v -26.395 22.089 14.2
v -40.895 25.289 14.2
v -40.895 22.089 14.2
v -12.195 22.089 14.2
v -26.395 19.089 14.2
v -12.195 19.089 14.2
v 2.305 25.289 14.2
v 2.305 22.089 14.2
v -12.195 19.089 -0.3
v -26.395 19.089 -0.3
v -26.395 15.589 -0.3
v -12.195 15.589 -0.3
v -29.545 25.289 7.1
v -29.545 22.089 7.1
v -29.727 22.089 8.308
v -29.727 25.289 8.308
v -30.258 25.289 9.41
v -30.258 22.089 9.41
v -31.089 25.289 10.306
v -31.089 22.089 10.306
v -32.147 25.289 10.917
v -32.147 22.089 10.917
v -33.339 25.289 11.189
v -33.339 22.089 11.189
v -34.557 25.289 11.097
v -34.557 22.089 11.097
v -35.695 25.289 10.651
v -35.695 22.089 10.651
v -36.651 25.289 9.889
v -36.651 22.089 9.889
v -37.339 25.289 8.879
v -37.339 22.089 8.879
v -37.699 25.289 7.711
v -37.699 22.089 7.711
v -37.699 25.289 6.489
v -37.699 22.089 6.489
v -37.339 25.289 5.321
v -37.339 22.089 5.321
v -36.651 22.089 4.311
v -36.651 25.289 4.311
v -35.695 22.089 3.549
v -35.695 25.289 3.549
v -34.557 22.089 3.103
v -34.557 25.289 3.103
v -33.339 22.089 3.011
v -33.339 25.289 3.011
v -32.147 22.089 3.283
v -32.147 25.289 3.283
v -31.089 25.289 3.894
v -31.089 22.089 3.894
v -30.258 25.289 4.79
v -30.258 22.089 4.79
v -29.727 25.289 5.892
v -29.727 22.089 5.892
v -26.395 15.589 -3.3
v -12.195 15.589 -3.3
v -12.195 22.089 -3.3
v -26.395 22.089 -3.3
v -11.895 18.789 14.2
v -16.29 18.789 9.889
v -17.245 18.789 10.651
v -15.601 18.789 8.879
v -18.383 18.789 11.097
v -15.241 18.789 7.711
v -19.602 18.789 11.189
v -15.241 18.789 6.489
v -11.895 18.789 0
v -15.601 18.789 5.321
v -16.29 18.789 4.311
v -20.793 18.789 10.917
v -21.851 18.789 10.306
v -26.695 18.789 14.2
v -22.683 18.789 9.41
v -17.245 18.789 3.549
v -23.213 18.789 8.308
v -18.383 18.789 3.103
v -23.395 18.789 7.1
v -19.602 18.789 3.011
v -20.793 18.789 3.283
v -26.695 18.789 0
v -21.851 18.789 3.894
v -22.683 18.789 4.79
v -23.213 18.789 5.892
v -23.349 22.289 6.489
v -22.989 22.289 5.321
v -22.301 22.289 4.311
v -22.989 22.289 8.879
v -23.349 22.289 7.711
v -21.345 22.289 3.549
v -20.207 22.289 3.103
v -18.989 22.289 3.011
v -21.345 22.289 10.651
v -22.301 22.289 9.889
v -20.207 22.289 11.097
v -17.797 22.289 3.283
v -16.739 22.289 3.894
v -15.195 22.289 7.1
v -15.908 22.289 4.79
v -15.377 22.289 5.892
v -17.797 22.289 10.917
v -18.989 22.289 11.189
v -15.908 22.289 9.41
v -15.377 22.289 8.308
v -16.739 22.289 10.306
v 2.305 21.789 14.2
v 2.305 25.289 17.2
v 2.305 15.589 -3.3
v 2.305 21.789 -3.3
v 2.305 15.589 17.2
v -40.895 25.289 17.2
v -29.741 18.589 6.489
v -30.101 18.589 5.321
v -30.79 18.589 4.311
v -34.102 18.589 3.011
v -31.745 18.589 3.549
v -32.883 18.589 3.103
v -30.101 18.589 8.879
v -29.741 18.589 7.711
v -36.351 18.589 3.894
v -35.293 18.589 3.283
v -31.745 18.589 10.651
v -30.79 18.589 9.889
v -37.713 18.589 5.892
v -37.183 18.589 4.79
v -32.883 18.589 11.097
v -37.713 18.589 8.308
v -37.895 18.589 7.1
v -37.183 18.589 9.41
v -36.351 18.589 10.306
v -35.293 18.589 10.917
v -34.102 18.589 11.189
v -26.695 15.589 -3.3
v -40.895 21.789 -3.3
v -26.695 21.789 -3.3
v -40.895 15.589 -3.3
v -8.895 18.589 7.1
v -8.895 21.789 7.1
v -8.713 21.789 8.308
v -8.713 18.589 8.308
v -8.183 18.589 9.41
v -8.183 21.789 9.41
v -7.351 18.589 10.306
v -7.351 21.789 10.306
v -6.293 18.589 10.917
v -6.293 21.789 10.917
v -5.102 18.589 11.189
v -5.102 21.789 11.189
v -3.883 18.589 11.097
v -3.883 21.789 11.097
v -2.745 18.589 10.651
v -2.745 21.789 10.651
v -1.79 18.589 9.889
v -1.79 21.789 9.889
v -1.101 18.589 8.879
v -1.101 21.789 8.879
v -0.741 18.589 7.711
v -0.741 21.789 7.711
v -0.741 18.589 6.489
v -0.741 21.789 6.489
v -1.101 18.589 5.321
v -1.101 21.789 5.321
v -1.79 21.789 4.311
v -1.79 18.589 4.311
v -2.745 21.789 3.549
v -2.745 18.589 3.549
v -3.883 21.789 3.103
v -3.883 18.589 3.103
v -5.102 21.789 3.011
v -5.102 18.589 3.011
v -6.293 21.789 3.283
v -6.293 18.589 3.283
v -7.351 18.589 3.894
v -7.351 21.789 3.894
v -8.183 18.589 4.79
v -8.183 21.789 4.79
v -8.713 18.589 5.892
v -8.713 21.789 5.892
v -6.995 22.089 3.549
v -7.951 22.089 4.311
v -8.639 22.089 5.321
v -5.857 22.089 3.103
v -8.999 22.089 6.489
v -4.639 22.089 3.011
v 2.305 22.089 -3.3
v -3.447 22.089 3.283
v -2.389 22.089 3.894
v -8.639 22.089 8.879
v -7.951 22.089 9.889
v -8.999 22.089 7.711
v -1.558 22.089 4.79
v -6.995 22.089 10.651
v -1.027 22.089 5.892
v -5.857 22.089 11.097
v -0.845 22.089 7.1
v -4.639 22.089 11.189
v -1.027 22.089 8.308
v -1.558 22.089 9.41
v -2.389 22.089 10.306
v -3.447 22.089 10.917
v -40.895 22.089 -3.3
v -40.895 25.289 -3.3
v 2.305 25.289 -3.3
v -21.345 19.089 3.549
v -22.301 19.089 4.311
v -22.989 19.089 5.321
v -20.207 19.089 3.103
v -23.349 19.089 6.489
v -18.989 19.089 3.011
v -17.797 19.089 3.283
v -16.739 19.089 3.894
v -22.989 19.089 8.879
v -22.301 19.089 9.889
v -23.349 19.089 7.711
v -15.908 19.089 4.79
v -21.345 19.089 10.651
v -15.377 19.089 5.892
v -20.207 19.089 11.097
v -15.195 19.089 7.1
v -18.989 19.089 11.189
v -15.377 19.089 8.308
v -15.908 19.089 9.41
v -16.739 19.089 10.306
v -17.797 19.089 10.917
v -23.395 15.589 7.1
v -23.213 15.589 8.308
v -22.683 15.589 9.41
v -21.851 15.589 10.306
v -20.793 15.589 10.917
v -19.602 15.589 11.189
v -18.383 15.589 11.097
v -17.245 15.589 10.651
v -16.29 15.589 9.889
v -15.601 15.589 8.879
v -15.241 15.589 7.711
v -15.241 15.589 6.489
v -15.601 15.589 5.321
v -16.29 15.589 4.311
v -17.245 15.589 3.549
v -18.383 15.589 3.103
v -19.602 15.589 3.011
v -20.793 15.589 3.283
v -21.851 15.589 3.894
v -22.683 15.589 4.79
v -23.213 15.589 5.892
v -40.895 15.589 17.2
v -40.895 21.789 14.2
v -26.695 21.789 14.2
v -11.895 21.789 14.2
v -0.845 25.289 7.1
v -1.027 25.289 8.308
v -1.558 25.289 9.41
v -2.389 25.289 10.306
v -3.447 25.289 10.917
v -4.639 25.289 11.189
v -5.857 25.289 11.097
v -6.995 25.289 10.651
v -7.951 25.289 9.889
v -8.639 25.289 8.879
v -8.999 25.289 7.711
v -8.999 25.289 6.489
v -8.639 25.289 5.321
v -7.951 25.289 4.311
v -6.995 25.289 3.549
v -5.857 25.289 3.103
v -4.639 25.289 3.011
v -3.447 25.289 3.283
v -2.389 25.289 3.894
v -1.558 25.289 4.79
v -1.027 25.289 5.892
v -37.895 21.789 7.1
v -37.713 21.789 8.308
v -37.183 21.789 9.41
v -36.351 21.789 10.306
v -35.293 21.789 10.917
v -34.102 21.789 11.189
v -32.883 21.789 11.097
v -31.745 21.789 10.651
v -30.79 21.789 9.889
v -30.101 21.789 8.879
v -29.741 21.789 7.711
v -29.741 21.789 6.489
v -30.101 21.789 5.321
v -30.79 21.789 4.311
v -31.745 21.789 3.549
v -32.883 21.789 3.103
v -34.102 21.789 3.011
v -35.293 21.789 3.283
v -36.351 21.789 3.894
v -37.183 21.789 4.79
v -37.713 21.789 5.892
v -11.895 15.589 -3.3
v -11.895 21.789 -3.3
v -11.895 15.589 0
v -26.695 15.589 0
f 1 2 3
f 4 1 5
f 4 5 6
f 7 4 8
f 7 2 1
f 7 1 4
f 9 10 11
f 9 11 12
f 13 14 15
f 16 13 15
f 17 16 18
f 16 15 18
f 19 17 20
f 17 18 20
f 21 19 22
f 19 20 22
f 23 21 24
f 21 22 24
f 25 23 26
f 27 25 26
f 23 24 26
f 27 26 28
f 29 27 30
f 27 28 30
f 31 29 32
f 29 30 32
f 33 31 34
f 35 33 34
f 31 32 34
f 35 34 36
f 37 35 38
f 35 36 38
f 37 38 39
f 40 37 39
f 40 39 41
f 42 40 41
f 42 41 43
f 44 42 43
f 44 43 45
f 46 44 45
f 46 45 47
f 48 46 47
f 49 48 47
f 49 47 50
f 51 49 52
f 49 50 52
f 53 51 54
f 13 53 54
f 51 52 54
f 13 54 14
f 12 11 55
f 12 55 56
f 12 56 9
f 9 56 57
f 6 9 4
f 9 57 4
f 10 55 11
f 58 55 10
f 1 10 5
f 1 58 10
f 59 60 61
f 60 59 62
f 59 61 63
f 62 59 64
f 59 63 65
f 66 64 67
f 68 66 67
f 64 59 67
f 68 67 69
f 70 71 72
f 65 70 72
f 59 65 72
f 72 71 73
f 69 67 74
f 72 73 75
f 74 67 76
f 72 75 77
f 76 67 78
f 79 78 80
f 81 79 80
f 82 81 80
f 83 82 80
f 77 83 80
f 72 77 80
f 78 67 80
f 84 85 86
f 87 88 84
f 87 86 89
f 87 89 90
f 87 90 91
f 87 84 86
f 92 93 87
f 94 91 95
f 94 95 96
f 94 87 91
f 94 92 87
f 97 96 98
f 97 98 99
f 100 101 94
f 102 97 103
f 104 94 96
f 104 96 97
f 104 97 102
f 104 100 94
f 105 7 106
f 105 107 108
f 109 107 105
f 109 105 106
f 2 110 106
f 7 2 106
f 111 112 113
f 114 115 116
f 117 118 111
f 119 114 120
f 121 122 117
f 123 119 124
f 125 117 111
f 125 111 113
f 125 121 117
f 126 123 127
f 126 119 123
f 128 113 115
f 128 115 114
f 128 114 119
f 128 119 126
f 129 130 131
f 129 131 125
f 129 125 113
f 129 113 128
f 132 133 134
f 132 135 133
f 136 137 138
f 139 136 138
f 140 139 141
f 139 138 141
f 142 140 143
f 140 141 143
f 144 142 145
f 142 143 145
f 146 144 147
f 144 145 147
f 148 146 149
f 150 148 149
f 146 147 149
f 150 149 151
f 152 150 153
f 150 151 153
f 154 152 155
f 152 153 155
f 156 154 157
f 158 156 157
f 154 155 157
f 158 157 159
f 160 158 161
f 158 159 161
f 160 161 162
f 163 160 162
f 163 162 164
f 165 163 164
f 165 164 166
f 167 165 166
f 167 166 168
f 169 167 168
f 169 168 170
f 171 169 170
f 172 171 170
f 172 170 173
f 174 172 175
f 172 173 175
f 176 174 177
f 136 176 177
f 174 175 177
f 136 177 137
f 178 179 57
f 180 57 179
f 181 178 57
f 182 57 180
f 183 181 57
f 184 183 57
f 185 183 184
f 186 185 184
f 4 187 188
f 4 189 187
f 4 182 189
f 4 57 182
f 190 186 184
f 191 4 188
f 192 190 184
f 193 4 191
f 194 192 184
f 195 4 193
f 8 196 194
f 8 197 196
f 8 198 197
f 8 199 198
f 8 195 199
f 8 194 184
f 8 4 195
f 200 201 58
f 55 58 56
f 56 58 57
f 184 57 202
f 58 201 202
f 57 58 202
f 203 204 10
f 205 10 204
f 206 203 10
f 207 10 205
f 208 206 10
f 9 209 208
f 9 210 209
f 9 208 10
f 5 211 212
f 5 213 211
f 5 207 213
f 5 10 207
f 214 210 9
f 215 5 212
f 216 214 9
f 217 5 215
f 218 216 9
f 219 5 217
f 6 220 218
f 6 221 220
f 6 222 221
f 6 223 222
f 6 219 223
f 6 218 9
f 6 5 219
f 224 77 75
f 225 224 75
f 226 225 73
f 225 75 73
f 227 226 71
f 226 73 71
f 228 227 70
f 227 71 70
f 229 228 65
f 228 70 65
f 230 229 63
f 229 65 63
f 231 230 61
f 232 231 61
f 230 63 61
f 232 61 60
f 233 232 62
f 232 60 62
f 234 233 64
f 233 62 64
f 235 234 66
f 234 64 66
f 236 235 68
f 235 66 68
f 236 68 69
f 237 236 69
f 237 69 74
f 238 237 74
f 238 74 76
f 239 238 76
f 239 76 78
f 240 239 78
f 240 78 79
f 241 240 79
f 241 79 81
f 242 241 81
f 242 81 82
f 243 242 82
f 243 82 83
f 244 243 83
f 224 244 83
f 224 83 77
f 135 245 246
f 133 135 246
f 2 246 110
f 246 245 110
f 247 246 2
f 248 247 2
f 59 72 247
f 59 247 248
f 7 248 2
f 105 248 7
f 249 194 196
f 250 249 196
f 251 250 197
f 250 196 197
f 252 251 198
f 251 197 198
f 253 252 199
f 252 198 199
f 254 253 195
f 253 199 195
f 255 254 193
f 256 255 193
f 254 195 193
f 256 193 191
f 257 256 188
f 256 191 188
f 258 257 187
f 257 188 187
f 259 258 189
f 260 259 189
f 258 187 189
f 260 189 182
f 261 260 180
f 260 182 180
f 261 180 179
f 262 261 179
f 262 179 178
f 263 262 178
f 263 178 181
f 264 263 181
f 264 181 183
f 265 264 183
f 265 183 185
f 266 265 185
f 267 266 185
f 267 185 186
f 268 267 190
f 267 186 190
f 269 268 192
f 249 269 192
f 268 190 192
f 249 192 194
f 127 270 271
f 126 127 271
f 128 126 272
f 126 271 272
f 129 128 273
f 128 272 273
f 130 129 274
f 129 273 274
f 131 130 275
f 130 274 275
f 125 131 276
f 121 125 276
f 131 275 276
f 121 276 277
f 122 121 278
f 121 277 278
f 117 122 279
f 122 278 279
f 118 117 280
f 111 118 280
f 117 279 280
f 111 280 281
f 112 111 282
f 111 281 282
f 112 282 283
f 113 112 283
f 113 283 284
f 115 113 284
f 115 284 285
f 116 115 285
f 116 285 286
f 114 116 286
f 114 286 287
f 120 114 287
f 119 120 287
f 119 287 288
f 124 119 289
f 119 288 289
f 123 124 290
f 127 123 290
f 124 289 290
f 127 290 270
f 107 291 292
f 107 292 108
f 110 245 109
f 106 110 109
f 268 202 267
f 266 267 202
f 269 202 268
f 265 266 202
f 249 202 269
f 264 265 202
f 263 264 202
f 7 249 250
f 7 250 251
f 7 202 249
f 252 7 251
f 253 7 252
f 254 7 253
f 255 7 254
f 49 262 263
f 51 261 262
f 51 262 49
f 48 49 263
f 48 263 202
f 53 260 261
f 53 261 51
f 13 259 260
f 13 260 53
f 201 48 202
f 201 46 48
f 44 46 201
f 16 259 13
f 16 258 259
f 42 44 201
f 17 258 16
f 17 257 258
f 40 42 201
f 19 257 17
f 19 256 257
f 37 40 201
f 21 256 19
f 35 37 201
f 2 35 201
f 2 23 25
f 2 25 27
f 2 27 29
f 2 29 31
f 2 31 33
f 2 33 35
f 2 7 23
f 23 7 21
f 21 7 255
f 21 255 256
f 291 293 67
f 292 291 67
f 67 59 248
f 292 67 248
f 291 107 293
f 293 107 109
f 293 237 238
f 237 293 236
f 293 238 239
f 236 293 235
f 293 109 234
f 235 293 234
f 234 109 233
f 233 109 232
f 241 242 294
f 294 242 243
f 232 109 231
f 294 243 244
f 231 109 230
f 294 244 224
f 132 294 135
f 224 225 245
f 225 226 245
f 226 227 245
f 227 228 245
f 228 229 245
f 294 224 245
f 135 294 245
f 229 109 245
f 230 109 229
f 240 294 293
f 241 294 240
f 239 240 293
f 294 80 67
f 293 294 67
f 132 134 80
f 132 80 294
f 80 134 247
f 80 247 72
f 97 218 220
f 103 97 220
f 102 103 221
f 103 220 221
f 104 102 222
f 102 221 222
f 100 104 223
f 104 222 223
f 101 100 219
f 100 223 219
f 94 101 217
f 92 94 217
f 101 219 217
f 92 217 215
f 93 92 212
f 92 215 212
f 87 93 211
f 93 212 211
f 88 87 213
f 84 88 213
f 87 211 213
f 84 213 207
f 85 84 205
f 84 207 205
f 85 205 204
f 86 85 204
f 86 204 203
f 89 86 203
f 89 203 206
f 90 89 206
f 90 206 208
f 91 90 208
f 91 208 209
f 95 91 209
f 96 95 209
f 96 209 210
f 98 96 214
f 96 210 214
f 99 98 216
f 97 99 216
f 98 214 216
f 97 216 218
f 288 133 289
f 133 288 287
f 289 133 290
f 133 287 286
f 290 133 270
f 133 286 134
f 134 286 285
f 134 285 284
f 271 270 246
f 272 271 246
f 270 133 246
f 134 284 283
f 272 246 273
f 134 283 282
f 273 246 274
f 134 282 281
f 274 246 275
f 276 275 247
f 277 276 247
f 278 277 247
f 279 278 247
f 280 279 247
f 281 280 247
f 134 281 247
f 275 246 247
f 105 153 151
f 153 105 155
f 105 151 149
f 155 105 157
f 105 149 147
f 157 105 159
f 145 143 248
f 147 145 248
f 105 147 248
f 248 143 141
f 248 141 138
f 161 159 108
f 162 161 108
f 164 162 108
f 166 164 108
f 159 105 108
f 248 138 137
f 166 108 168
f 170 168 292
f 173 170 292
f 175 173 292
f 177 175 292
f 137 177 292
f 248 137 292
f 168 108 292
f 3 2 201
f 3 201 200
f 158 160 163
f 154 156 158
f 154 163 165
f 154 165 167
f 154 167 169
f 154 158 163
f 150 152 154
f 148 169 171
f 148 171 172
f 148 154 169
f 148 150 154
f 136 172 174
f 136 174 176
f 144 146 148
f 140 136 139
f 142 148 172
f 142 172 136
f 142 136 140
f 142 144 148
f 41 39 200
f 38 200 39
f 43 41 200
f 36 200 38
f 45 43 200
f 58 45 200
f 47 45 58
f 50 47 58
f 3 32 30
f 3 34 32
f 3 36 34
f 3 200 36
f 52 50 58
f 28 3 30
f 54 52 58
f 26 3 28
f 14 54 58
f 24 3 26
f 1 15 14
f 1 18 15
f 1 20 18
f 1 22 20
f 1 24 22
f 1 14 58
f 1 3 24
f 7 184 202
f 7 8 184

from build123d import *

# Parameters (mm, degrees)
F1_DEPTH  = 14.2
F2_DEPTH  = 14.2
F4_R      = 4.1
F3_R      = 4.1
F5_DEPTH  = 3.2
F6_R      = 4.1
F7_DEPTH  = 3.201
F9_R      = 4.1
F8_R      = 4.1
F11_DEPTH = 3.2
F10_R     = 4.1
F12_DEPTH = 3.2
F13_W     = 43.2
F13_H     = 3
F14_DEPTH = 9.7
F16_DEPTH = 3.3
F17_DEPTH = 3.3
F18_W     = 14.2
F18_H     = 3
F19_DEPTH = 3.5


with BuildPart() as f1:
    # F0 (on Top) → F1 (new body)
    with BuildSketch(Plane.XY):
        Polygon((-40.8951626662, 21.7891706413), (-40.8951626662, 15.5891706413), (2.3048373338, 15.5891706413), (2.3048373338, 21.7891706413), (-11.8951626662, 21.7891706413), (-11.8951626662, 18.7891706413), (-26.6951626662, 18.7891706413), (-26.6951626662, 21.7891706413), align=None)
    extrude(amount=F1_DEPTH)

    # F4 (on face) + F3 (on face) → F5 (cut)
    with BuildSketch(Plane(origin=(0, 21.7891706413, 0), x_dir=(-1, 0, 0), z_dir=(0, 1, 0))):
        with Locations((4.7951626662, 7.1)):
            Circle(F4_R)
    with BuildSketch(Plane(origin=(0, 21.7891706413, 0), x_dir=(-1, 0, 0), z_dir=(0, 1, 0))):
        with Locations((33.7951626662, 7.1)):
            Circle(F3_R)
    extrude(amount=-F5_DEPTH, mode=Mode.SUBTRACT)

    # F6 (on face) → F7 (cut, through all)
    with BuildSketch(Plane(origin=(0, 18.7891706413, 0), x_dir=(-1, 0, 0), z_dir=(0, 1, 0))):
        with Locations((19.2951626662, 7.1)):
            Circle(F6_R)
    extrude(amount=-F7_DEPTH, mode=Mode.SUBTRACT)

    # F13 (on face) → F14 (join, through all)
    with BuildSketch(Plane.XZ.offset(-15.5891706413)):
        with Locations((-19.2951626662, 15.7)):
            Rectangle(F13_W, F13_H)
    extrude(amount=-F14_DEPTH)

    # F15 (on face) → F16 (join)
    with BuildSketch(Plane(origin=(0, 0, 0), x_dir=(1, 0, 0), z_dir=(0, 0, -1))):
        Polygon((-40.8951626662, -21.7891706413), (-26.6951626662, -21.7891706413), (-26.6951626662, -18.7891706413), (-26.6951626662, -15.5891706413), (-40.8951626662, -15.5891706413), align=None)
        Polygon((-11.8951626662, -15.5891706413), (-11.8951626662, -18.7891706413), (-11.8951626662, -21.7891706413), (2.3048373338, -21.7891706413), (2.3048373338, -15.5891706413), align=None)
    extrude(amount=F16_DEPTH)


with BuildPart() as f2:
    # F0 (on Top) → F2 (new body)
    with BuildSketch(Plane.XY):
        Polygon((2.3048373338, 25.2891706413), (-40.8951626662, 25.2891706413), (-40.8951626662, 22.0891706413), (-26.3951626662, 22.0891706413), (-26.3951626662, 19.0891706413), (-12.1951626662, 19.0891706413), (-12.1951626662, 22.0891706413), (2.3048373338, 22.0891706413), align=None)
    extrude(amount=F2_DEPTH)

    # F9 (on face) + F8 (on face) → F11 (cut)
    with BuildSketch(Plane.XZ.offset(-22.0891706413)):
        with Locations((-4.9451626662, 7.1)):
            Circle(F9_R)
    with BuildSketch(Plane.XZ.offset(-22.0891706413)):
        with Locations((-33.6451626662, 7.1)):
            Circle(F8_R)
    extrude(amount=-F11_DEPTH, mode=Mode.SUBTRACT)

    # F10 (on face) → F12 (cut)
    with BuildSketch(Plane.XZ.offset(-19.0891706413)):
        with Locations((-19.2951626662, 7.1)):
            Circle(F10_R)
    extrude(amount=-F12_DEPTH, mode=Mode.SUBTRACT)

    # F17 (add, through all): a face of the model
    f17_faces = [f2.faces().sort_by_distance(p)[0] for p in [
        (-19.2951626662, 22.958911849, 0),
    ]]
    extrude(f17_faces, amount=F17_DEPTH)

    # F18 (on face) → F19 (join, through all)
    with BuildSketch(Plane.XZ.offset(-19.0891706413)):
        with Locations((-19.2951626662, -1.8)):
            Rectangle(F18_W, F18_H)
    extrude(amount=F19_DEPTH)


solid = Compound([f1.part, f2.part])
